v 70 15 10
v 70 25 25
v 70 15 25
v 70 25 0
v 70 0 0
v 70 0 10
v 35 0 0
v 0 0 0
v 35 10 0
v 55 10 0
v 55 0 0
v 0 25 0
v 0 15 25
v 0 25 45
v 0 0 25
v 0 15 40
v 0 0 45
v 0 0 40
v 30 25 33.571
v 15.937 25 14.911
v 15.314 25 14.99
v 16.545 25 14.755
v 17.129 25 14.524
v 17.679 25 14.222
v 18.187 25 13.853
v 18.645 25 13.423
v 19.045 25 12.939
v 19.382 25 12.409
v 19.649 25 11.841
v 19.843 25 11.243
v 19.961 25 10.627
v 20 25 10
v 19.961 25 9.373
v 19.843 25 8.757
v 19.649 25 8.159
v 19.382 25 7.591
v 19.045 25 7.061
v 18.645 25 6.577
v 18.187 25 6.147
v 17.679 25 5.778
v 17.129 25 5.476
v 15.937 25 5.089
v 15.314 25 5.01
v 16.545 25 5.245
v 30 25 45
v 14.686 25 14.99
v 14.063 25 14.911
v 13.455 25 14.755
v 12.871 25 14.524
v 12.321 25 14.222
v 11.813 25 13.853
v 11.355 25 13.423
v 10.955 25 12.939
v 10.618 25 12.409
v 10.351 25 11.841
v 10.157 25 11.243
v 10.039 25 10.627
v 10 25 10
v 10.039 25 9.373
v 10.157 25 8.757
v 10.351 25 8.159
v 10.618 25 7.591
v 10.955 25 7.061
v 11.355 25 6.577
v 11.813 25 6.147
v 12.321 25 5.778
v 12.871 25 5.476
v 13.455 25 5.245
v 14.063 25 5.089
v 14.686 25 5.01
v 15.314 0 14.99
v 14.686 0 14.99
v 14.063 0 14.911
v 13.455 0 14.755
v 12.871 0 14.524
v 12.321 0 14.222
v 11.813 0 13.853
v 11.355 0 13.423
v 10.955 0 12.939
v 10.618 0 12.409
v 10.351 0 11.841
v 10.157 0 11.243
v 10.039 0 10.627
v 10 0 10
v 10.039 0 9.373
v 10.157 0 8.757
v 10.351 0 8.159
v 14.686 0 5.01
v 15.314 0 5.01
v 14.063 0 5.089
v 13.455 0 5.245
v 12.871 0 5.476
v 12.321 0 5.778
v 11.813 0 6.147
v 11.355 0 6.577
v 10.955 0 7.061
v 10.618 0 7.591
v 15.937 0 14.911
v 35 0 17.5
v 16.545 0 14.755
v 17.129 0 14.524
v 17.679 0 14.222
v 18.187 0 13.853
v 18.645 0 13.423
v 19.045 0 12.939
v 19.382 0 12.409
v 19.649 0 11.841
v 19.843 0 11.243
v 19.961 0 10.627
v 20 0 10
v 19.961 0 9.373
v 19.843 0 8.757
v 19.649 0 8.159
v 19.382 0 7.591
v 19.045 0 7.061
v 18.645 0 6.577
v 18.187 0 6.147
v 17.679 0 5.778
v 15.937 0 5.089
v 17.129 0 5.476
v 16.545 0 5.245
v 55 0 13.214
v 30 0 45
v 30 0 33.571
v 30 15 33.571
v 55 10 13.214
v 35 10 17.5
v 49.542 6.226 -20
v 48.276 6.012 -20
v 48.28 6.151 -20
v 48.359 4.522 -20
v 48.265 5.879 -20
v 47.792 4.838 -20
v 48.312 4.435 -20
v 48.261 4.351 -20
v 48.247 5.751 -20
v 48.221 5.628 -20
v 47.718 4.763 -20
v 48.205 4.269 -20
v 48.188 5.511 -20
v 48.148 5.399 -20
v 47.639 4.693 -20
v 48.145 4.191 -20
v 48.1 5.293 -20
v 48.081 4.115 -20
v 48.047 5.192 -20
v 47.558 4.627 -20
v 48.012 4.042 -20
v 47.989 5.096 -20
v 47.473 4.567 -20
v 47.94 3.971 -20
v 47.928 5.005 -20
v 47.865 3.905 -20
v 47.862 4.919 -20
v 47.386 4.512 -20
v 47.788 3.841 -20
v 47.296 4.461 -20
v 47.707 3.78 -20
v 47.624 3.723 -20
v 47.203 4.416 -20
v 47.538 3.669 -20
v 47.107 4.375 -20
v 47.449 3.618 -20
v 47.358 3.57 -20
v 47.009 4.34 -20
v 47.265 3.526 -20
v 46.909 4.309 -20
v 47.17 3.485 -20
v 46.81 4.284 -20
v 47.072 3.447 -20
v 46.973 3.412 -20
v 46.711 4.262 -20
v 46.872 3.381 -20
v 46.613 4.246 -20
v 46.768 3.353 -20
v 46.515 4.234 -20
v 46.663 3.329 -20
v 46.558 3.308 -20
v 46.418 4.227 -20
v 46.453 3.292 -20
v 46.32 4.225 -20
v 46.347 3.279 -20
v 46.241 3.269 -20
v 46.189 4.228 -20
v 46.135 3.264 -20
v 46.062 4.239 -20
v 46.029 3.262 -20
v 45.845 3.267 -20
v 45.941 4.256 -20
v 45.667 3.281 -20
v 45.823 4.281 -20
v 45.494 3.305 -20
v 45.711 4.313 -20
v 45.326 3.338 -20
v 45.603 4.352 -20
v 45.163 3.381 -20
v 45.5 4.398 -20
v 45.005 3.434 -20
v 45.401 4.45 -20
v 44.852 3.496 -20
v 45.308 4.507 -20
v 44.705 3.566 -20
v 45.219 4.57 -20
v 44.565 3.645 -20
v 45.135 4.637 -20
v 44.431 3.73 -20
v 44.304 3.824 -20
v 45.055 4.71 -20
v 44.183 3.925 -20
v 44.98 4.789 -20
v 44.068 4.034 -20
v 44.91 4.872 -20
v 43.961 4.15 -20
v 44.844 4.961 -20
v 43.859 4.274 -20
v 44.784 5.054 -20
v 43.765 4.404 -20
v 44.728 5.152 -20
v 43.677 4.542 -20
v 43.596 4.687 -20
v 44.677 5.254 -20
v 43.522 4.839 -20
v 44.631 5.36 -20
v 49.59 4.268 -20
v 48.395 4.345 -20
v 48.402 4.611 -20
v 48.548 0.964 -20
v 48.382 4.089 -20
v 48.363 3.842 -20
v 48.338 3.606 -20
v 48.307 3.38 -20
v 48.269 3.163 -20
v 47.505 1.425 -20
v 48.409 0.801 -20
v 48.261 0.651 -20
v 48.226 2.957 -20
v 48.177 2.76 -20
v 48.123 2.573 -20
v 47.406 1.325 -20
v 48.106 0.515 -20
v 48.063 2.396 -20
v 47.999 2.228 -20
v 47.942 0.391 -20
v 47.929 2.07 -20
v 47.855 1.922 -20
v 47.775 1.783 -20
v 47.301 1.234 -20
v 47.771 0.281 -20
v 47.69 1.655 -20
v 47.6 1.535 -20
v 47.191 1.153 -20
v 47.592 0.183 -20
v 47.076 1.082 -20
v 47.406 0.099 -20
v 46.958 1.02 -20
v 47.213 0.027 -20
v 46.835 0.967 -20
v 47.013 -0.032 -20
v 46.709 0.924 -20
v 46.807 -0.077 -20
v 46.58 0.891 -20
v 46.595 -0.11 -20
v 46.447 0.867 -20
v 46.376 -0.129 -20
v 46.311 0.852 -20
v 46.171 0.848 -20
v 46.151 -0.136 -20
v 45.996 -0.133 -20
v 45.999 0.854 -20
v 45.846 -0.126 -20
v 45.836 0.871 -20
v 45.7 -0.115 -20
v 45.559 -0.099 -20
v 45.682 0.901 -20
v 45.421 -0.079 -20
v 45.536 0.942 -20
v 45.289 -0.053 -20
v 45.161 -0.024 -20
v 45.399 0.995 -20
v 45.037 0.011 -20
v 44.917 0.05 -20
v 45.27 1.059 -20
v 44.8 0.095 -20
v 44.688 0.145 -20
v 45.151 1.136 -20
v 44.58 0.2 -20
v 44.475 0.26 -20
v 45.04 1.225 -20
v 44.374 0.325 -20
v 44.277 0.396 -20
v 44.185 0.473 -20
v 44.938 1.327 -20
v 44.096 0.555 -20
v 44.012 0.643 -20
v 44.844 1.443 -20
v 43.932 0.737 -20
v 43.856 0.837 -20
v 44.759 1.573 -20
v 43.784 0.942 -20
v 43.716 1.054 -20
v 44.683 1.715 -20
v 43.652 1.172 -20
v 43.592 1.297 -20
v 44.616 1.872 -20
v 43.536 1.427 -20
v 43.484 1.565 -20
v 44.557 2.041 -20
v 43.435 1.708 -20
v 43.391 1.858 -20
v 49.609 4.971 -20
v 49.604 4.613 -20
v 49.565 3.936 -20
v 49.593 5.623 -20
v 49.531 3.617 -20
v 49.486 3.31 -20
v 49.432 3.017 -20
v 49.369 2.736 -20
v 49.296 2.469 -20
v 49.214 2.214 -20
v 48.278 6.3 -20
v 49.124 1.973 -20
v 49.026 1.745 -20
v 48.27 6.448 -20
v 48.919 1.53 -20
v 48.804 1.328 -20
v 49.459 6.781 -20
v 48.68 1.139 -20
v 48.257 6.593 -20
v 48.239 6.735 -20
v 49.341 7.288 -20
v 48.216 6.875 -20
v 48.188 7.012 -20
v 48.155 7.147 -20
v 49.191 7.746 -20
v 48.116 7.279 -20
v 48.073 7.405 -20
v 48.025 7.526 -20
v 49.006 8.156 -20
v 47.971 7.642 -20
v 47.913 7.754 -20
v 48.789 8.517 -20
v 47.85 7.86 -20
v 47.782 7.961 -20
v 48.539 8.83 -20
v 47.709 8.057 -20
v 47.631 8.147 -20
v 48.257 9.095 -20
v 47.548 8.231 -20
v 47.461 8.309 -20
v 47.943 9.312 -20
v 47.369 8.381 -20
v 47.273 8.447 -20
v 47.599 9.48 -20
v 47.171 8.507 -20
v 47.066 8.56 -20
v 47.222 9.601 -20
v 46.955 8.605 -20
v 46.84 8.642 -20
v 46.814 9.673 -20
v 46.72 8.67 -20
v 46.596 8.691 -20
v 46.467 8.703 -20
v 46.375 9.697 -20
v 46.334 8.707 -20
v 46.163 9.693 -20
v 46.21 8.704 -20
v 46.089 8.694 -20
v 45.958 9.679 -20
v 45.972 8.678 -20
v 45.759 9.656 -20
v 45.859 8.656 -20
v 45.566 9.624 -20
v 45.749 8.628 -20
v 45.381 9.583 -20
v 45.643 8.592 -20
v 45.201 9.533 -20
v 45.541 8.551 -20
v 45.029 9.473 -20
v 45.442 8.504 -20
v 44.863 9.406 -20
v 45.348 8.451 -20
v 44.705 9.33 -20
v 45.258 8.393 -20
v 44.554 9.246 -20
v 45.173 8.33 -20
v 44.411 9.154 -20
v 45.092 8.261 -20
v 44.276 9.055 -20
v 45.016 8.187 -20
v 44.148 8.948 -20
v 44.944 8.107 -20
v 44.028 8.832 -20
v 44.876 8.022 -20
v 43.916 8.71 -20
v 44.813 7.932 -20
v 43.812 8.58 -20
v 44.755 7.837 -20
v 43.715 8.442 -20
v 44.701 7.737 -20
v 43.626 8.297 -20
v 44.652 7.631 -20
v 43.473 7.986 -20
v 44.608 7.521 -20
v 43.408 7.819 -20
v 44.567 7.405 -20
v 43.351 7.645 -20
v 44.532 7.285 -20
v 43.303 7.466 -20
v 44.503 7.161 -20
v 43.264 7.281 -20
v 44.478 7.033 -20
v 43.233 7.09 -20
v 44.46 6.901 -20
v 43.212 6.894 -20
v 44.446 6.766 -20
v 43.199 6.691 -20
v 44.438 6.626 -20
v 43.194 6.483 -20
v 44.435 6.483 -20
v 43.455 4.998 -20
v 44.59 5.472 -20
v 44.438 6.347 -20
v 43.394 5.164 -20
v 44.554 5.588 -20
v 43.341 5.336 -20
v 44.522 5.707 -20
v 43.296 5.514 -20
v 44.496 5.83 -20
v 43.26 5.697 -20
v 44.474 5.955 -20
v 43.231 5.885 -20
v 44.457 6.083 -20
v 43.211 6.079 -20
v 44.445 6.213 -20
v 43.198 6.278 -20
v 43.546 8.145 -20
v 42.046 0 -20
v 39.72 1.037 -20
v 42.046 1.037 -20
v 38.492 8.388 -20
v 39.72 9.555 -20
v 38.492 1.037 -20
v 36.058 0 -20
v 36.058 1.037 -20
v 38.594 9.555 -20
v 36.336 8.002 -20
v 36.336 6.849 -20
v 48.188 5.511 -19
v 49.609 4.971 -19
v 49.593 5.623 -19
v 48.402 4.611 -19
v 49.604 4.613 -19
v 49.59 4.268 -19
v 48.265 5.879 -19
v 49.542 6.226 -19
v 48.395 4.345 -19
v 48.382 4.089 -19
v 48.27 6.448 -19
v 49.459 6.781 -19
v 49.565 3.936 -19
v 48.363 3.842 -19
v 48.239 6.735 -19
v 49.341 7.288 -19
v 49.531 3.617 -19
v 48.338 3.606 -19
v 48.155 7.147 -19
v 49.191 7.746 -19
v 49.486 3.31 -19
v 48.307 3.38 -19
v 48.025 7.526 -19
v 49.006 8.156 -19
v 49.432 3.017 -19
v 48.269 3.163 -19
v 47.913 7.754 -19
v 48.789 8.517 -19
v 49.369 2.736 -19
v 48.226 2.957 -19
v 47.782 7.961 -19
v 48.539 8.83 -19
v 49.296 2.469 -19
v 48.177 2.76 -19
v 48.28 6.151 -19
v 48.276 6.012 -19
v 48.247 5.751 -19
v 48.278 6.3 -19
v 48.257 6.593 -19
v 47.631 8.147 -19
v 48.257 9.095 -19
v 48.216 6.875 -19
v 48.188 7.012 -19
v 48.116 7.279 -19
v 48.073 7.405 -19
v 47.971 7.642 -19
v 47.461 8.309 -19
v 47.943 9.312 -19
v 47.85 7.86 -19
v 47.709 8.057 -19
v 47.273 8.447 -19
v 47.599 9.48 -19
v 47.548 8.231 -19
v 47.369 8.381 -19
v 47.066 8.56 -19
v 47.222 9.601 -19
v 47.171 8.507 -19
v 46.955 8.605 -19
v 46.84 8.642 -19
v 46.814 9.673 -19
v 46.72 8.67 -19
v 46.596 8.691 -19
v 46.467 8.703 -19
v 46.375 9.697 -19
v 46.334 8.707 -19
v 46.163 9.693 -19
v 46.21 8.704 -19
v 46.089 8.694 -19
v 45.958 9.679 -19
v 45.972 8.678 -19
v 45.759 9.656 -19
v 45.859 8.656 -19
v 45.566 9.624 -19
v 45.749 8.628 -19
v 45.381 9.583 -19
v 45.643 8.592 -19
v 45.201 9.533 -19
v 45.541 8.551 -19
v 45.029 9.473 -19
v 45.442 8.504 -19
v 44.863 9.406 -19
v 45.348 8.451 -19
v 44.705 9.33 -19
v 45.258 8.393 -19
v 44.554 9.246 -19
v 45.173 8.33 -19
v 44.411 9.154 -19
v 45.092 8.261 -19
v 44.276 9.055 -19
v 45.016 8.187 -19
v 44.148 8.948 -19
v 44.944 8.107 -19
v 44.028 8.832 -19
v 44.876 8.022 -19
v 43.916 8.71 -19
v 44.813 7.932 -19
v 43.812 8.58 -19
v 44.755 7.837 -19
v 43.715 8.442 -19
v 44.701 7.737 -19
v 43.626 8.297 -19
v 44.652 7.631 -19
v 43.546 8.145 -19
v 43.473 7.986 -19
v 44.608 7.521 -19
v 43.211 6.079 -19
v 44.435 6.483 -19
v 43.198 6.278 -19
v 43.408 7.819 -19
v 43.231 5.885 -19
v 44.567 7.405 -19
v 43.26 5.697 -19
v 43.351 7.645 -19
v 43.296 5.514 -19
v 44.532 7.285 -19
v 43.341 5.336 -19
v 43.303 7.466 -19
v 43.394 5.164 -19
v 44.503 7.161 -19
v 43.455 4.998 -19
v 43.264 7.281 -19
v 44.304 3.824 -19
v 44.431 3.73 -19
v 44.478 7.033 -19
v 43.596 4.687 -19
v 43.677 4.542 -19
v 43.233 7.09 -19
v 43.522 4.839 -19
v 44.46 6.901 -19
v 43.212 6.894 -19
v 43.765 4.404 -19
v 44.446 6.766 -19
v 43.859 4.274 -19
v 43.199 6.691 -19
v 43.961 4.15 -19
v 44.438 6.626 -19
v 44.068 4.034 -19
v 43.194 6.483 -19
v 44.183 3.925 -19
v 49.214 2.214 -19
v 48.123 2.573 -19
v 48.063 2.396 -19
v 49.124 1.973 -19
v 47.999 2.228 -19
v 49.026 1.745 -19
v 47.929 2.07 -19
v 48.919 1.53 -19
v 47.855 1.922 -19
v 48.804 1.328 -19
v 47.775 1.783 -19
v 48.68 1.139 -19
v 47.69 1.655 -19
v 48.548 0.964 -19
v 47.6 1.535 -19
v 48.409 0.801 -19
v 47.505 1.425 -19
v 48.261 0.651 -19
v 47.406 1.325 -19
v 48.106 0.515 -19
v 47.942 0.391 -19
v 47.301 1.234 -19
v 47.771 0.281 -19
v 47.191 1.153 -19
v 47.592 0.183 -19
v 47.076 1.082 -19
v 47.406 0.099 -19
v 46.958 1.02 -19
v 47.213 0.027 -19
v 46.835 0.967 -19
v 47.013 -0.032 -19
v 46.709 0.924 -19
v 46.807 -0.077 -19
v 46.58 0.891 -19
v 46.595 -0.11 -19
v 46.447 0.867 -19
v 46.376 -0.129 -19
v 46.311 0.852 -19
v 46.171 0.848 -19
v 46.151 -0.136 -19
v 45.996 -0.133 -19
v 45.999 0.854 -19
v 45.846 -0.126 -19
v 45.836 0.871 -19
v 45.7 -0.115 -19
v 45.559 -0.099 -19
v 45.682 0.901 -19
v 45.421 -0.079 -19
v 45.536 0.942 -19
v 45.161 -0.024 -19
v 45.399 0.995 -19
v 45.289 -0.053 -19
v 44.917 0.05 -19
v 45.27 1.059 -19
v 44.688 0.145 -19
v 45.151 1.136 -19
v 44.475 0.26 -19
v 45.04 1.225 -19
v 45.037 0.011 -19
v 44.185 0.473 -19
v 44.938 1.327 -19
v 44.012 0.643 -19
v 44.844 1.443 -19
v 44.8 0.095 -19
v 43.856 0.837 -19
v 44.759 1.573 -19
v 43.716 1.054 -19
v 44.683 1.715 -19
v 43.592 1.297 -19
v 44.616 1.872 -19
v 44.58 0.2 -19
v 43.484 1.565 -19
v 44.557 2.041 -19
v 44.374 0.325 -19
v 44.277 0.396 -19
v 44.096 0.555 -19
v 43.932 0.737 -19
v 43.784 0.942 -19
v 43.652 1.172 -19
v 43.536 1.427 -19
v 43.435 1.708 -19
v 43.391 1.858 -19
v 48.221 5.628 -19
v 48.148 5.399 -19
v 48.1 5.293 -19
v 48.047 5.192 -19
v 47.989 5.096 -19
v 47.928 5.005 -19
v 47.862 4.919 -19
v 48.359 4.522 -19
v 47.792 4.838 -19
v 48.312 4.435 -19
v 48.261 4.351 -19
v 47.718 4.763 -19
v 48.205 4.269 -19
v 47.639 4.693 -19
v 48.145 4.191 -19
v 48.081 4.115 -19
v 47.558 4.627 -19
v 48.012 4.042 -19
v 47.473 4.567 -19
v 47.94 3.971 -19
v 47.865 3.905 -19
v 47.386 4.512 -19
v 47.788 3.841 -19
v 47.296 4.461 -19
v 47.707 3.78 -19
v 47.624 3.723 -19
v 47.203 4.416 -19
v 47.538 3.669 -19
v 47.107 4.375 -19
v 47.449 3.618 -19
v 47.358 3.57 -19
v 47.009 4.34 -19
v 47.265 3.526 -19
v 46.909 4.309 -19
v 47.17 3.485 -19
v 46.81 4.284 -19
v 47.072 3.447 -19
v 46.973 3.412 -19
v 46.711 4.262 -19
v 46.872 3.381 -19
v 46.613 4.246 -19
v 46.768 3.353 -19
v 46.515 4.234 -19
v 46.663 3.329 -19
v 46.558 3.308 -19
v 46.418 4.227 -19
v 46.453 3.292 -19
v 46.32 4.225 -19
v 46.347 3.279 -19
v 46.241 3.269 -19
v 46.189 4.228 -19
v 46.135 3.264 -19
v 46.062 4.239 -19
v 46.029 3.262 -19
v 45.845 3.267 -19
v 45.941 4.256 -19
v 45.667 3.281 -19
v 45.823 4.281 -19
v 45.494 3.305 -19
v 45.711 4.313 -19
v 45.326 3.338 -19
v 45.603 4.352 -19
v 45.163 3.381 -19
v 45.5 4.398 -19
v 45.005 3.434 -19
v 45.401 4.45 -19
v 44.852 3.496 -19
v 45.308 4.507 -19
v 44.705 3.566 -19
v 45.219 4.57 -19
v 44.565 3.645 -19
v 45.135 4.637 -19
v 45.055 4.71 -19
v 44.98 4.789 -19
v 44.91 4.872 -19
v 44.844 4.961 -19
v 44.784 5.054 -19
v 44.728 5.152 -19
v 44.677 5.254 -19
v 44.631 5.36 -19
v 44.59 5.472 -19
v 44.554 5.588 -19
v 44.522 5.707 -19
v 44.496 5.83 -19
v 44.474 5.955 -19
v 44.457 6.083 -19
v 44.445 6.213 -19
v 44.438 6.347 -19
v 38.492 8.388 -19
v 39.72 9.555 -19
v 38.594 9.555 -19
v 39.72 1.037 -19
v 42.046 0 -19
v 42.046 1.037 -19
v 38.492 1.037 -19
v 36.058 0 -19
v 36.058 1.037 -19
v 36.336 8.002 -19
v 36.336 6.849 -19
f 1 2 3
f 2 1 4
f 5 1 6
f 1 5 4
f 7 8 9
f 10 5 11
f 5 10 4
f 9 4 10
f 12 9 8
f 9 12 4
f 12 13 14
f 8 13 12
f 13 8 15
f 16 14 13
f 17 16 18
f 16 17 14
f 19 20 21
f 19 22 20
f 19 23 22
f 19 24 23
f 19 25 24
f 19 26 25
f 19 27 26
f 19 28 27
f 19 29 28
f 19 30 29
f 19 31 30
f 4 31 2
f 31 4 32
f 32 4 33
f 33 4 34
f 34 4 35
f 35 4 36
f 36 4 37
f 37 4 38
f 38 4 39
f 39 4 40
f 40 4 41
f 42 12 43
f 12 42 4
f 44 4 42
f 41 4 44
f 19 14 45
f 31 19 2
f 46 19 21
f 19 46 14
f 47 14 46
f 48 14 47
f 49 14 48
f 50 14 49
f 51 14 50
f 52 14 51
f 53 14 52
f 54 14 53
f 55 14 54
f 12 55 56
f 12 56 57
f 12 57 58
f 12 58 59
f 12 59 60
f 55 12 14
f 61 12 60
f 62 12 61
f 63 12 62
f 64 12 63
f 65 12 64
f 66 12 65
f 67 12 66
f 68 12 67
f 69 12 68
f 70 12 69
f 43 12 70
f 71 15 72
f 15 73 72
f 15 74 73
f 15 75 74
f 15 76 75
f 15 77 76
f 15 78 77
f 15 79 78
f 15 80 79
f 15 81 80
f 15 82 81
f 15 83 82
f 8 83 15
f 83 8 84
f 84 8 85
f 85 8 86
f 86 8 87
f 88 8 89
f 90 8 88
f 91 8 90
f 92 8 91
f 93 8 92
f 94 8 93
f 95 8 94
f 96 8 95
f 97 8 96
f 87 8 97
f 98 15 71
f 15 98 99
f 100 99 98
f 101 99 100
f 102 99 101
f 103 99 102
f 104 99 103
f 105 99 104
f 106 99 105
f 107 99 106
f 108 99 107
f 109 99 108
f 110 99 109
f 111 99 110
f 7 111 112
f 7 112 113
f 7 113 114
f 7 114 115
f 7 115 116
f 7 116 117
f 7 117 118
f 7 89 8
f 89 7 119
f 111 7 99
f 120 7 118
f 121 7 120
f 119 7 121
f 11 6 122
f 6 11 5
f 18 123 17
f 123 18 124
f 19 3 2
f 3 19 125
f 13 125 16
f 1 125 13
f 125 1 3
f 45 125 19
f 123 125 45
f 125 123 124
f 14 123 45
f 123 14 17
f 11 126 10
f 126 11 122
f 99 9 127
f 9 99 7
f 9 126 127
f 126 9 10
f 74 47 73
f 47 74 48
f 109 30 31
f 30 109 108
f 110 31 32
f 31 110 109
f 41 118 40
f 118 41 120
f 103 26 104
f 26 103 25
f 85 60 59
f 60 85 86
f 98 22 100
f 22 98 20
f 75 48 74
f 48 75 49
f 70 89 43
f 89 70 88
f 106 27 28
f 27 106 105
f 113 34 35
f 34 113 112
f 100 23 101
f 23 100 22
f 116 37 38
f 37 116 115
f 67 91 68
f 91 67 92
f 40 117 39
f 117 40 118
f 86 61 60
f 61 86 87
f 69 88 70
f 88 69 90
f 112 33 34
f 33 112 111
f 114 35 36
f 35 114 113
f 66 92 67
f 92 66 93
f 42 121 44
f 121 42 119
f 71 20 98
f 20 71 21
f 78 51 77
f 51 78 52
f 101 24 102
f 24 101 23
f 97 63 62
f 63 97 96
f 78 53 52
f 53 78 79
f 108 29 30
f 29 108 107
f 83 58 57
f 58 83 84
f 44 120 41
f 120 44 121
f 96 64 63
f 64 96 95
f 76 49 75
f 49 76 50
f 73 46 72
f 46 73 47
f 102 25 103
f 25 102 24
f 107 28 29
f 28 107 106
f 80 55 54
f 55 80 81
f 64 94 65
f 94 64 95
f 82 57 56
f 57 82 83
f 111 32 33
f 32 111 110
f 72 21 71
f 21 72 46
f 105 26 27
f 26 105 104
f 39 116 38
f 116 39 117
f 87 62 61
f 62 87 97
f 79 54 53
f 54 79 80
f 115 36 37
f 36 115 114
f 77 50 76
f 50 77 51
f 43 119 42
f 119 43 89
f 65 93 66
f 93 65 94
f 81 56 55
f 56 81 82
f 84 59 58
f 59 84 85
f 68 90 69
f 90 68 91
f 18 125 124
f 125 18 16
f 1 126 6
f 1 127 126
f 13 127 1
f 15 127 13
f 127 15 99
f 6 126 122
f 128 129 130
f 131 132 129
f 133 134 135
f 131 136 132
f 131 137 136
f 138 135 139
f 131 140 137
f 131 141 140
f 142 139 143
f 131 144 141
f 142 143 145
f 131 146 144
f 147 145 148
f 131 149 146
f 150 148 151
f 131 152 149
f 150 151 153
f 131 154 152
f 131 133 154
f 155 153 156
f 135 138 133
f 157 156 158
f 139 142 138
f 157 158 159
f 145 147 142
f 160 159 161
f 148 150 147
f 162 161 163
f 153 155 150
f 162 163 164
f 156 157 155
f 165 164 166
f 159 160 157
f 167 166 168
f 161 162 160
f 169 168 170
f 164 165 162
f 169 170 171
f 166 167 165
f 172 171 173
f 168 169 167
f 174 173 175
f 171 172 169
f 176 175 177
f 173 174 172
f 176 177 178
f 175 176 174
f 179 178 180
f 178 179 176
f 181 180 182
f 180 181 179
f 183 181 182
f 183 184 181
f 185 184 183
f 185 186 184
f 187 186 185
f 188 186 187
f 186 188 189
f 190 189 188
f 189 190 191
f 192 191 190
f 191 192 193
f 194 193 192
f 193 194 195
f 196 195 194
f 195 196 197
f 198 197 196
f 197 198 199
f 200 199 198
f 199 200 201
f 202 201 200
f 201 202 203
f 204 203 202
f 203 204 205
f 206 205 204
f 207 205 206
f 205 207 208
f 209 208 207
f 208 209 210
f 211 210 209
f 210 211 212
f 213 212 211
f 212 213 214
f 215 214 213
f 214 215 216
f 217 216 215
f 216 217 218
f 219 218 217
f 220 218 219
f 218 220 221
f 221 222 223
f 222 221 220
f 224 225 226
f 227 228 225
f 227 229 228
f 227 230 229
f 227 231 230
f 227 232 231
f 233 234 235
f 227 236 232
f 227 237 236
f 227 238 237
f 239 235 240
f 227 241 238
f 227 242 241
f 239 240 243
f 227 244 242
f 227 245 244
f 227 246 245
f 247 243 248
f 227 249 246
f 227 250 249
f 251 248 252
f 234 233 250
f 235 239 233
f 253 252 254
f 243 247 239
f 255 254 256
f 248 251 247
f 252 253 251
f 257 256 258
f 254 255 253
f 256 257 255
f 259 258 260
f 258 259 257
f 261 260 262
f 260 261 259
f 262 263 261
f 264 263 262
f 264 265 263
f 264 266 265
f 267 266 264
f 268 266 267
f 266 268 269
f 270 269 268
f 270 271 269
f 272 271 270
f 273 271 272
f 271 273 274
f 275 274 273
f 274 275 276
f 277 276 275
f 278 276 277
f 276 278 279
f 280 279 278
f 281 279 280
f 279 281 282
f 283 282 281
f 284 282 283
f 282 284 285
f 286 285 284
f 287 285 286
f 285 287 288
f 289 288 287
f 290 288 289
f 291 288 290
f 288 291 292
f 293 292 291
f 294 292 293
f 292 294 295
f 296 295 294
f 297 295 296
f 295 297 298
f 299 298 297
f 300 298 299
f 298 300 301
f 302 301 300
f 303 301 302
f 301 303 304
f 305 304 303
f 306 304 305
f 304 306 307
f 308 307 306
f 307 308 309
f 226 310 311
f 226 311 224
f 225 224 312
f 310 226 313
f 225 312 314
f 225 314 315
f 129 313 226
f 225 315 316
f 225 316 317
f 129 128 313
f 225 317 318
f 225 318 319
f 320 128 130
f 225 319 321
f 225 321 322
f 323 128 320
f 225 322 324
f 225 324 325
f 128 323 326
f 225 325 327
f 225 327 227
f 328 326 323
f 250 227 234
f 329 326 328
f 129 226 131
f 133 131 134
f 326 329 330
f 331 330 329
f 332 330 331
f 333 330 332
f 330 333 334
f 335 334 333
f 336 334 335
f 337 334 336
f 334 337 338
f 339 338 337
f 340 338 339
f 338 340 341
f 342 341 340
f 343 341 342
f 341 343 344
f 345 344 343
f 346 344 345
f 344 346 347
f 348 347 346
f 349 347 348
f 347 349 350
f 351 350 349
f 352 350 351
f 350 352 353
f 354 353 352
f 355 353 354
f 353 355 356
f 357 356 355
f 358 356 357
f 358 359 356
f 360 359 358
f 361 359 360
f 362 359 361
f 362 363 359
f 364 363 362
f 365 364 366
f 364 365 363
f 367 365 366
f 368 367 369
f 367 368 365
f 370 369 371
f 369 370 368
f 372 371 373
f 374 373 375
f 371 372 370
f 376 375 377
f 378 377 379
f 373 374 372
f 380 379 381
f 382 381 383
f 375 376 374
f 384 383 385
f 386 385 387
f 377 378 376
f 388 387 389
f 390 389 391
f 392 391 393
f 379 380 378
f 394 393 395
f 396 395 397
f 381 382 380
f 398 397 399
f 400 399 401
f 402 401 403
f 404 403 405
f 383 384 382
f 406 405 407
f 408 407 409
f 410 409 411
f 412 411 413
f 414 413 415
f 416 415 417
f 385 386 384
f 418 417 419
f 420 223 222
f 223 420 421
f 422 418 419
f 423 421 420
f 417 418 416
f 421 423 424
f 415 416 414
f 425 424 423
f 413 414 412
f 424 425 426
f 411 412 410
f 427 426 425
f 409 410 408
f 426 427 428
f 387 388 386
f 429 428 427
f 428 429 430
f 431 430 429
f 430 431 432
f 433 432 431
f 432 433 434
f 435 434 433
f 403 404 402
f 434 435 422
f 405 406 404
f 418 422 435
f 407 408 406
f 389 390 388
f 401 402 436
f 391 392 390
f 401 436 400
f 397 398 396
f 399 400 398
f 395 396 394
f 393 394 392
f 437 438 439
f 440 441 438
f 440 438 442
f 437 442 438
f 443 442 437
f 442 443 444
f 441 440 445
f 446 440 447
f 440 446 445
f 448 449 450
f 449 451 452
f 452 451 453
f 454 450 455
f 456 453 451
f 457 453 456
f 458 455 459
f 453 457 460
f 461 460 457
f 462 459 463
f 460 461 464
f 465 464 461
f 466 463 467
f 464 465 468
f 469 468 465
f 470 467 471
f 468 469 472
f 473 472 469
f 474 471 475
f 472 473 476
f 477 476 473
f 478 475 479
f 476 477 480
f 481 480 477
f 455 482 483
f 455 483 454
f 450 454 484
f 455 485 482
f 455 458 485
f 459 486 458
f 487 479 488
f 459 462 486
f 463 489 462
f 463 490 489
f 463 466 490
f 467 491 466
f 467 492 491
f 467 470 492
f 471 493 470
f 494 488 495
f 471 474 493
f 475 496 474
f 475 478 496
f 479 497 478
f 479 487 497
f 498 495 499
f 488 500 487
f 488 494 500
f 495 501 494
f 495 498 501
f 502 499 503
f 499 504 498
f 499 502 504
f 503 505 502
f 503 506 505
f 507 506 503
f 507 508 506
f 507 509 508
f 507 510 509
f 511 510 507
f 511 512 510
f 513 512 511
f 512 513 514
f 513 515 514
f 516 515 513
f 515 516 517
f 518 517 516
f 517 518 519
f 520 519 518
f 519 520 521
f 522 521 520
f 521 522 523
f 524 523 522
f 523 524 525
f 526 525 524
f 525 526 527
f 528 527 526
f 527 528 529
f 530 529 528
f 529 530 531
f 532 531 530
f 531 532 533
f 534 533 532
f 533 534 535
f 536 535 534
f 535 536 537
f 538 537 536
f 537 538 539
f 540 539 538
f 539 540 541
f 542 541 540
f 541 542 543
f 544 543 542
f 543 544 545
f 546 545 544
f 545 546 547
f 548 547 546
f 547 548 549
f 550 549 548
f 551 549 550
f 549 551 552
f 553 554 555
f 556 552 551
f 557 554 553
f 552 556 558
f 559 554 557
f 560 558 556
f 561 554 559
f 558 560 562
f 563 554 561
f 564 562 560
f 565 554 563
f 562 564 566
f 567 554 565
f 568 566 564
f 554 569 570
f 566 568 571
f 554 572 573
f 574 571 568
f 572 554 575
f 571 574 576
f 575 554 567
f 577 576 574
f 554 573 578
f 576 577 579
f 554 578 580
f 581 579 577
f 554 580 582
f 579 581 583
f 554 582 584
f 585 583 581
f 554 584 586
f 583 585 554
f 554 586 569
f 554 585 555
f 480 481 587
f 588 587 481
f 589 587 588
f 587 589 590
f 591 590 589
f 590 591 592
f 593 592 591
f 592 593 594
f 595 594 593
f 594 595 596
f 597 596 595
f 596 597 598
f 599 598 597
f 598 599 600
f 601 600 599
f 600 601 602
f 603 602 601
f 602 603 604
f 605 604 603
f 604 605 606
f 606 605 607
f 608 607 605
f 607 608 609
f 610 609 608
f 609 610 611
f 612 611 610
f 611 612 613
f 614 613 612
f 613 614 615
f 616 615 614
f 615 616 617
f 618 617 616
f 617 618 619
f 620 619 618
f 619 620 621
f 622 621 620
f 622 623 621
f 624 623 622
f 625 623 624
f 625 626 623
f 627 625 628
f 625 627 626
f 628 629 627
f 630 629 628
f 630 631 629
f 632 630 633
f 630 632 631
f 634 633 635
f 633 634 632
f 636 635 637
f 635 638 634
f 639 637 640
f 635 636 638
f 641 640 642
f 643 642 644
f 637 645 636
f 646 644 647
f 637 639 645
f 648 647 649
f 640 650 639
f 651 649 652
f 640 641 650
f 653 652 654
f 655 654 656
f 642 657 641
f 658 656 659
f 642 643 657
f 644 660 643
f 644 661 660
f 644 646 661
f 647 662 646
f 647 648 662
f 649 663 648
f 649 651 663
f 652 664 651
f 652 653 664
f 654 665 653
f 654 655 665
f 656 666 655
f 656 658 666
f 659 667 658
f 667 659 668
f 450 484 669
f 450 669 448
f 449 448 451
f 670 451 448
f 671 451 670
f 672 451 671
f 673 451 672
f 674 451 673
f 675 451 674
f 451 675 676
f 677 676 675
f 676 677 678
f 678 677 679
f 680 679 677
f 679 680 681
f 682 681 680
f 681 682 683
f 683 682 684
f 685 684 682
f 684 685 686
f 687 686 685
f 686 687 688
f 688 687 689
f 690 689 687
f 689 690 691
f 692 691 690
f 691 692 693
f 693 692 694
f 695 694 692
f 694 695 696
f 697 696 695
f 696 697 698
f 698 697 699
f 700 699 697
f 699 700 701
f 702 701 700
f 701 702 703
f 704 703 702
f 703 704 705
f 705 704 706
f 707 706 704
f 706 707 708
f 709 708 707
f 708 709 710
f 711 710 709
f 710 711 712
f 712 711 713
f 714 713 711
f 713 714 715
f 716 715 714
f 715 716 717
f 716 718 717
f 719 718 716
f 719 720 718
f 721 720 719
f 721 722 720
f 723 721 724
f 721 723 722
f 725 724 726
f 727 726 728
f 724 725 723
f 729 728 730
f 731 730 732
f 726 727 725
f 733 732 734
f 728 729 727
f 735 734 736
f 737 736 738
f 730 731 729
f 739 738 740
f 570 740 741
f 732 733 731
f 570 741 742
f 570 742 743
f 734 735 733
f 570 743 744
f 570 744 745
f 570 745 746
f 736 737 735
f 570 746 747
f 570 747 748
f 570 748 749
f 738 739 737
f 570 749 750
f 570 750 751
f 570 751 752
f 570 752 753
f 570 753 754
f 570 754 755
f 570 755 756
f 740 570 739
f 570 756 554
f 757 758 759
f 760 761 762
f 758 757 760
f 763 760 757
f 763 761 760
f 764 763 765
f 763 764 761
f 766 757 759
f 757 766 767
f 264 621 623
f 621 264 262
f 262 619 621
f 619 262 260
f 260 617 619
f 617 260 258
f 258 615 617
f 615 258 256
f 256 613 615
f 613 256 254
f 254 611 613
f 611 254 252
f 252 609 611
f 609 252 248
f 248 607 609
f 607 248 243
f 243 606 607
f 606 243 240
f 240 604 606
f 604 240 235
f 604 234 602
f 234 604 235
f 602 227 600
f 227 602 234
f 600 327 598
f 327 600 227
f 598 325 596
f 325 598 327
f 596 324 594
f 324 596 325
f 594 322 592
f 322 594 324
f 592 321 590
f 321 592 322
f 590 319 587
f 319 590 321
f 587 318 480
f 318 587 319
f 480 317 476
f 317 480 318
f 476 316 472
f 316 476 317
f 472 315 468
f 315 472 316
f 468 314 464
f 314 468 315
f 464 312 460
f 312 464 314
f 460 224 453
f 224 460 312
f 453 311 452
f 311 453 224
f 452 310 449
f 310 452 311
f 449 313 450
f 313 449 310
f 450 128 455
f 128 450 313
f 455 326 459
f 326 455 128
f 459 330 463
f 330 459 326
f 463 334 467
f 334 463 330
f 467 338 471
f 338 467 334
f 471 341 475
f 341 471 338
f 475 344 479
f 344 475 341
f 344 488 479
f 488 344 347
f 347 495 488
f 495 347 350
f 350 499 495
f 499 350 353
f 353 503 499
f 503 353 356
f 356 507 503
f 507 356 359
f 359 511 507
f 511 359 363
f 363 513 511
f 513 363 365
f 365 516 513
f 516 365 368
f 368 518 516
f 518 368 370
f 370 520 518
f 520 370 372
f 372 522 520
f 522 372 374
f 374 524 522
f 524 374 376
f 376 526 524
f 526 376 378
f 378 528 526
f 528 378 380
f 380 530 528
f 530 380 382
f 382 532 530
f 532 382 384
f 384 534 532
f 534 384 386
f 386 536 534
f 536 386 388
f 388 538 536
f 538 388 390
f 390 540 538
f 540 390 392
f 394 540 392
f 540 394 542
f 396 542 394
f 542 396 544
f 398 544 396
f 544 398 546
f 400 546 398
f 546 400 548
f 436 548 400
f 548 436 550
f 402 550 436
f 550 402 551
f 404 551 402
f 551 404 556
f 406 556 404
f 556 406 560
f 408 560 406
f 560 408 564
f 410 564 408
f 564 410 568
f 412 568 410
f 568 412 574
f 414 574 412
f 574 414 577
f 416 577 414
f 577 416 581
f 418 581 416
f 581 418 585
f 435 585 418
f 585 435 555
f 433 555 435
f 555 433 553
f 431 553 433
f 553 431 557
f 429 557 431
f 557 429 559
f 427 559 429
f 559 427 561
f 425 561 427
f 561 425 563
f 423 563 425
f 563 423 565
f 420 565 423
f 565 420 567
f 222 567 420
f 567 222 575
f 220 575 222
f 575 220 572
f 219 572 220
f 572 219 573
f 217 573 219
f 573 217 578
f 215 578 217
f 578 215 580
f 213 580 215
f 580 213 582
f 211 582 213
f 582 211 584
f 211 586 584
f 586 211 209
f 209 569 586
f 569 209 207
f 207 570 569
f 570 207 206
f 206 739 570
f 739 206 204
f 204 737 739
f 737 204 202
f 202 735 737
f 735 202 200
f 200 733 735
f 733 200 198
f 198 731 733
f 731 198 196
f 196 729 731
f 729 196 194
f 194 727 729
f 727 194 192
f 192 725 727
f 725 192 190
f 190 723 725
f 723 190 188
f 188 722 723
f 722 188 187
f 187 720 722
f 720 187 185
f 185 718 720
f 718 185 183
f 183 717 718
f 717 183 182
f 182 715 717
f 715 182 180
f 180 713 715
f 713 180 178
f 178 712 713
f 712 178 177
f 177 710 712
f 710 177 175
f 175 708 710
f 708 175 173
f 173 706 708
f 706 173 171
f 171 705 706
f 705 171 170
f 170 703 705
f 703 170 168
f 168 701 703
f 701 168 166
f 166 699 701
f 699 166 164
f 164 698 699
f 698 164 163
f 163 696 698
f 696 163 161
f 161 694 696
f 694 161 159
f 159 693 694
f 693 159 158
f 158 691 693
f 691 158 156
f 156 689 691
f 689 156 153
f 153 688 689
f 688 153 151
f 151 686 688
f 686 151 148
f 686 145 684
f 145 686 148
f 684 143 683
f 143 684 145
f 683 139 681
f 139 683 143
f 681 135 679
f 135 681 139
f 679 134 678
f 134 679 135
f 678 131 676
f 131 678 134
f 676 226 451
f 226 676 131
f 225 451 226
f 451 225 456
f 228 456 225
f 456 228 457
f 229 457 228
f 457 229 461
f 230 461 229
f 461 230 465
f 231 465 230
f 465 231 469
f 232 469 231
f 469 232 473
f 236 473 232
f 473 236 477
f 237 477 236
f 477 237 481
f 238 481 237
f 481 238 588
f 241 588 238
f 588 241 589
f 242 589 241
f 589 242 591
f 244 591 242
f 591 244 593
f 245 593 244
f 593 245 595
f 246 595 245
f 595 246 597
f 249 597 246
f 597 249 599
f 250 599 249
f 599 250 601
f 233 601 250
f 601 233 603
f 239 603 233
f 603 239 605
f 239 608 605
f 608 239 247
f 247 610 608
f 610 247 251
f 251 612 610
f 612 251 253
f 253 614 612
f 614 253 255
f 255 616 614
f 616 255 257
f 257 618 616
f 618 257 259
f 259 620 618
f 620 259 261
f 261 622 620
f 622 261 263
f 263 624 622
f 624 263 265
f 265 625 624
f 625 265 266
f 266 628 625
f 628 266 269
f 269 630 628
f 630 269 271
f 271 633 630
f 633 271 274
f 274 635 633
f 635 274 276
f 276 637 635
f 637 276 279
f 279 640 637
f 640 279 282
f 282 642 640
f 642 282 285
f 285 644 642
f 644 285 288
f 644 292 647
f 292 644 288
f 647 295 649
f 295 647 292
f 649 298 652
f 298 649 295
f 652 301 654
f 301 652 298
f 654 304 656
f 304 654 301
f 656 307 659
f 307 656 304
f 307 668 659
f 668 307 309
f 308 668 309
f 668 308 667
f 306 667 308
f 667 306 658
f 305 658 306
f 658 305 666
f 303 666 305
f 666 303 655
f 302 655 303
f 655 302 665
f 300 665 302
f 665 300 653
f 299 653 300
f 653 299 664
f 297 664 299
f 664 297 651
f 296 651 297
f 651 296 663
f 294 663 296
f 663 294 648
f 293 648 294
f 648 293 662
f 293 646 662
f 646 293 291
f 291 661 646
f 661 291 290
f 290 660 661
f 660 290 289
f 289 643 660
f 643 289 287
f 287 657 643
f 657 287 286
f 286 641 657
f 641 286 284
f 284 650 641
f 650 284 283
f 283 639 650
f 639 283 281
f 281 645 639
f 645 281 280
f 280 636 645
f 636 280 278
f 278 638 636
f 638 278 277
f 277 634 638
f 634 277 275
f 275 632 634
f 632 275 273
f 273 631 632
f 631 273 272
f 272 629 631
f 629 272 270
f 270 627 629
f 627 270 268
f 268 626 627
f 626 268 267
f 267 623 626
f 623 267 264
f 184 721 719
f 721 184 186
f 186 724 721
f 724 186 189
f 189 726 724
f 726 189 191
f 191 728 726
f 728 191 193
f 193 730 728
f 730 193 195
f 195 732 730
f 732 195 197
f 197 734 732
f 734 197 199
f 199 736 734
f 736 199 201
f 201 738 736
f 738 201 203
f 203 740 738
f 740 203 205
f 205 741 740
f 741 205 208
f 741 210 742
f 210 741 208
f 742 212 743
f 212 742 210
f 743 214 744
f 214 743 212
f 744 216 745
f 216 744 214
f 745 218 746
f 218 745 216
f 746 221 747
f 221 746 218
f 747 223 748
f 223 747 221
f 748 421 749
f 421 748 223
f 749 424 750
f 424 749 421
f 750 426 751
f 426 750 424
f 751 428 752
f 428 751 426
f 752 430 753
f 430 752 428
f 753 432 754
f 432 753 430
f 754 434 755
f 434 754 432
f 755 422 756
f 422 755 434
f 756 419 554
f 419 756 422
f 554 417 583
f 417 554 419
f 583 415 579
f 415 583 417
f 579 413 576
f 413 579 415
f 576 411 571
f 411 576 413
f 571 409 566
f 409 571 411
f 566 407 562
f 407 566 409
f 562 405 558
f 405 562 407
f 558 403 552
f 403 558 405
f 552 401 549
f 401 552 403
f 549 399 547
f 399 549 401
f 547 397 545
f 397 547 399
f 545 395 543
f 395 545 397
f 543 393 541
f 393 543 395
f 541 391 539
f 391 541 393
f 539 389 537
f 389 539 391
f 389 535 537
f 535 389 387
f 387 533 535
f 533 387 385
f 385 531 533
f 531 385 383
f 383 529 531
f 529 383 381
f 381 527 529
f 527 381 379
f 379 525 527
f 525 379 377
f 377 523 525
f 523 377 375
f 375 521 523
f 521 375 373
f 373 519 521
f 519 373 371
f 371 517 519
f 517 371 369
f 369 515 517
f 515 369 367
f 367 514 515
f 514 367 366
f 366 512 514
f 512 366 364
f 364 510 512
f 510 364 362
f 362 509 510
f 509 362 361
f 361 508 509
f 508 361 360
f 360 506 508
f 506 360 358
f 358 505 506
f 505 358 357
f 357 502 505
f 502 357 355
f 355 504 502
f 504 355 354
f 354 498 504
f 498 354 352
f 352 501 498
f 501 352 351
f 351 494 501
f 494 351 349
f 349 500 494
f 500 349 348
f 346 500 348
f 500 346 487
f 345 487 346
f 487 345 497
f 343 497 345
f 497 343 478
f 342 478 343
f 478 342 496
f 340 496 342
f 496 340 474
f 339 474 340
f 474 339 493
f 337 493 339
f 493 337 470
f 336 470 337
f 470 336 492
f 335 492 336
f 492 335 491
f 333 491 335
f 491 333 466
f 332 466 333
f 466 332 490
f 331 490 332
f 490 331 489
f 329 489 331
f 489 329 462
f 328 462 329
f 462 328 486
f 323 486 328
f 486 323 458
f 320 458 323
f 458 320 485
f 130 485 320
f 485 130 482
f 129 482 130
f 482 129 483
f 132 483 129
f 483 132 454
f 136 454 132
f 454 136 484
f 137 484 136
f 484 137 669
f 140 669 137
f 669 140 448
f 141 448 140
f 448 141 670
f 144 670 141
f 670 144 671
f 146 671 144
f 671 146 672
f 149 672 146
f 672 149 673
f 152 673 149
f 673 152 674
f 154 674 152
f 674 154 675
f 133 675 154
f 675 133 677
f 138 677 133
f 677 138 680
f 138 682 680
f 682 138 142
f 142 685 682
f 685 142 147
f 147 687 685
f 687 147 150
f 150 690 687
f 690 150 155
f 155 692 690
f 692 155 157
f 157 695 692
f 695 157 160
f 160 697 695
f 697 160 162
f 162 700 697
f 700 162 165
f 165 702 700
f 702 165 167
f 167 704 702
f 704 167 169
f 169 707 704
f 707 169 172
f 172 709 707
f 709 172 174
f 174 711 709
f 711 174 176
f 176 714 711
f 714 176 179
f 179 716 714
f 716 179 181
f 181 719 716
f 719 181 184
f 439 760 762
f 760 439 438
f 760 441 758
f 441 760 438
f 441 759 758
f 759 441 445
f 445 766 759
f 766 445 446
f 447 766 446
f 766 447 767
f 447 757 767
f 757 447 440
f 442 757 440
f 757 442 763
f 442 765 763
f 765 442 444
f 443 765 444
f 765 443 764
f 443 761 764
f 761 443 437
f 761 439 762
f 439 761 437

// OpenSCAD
$fn=50;

cw=70;
cd=25;
ch=45;
cy=10;


M1 = [[cw,   0,  0,  0],
      [0,    1,  0,  0],
      [-15,  0,  1,  25]];

M2 = [[cw,  0,  0,  0],
      [0,   1,  0,  15],
      [30-ch,   0,  25,  ch-30]];


difference() {
    union() {
        cube([cw,cd,25]);
        multmatrix(M2) {
            cube([1,10,1]);
        }
        translate([0,15,0])
        cube([cw,10,15]);
        translate([0,0,ch-15])
        cube([30,cd,15]);
    }
    translate([cw-35,0,0])
    cube([20,10,ch]);
    translate([15,cd,10])
    rotate([90,0,0])
    cylinder(h=cd,d=cy);
    multmatrix(M1) {
        cube([1,15,15]);
    }
}

translate([cw/2,0,-20])
linear_extrude(height=1)
text("19");
